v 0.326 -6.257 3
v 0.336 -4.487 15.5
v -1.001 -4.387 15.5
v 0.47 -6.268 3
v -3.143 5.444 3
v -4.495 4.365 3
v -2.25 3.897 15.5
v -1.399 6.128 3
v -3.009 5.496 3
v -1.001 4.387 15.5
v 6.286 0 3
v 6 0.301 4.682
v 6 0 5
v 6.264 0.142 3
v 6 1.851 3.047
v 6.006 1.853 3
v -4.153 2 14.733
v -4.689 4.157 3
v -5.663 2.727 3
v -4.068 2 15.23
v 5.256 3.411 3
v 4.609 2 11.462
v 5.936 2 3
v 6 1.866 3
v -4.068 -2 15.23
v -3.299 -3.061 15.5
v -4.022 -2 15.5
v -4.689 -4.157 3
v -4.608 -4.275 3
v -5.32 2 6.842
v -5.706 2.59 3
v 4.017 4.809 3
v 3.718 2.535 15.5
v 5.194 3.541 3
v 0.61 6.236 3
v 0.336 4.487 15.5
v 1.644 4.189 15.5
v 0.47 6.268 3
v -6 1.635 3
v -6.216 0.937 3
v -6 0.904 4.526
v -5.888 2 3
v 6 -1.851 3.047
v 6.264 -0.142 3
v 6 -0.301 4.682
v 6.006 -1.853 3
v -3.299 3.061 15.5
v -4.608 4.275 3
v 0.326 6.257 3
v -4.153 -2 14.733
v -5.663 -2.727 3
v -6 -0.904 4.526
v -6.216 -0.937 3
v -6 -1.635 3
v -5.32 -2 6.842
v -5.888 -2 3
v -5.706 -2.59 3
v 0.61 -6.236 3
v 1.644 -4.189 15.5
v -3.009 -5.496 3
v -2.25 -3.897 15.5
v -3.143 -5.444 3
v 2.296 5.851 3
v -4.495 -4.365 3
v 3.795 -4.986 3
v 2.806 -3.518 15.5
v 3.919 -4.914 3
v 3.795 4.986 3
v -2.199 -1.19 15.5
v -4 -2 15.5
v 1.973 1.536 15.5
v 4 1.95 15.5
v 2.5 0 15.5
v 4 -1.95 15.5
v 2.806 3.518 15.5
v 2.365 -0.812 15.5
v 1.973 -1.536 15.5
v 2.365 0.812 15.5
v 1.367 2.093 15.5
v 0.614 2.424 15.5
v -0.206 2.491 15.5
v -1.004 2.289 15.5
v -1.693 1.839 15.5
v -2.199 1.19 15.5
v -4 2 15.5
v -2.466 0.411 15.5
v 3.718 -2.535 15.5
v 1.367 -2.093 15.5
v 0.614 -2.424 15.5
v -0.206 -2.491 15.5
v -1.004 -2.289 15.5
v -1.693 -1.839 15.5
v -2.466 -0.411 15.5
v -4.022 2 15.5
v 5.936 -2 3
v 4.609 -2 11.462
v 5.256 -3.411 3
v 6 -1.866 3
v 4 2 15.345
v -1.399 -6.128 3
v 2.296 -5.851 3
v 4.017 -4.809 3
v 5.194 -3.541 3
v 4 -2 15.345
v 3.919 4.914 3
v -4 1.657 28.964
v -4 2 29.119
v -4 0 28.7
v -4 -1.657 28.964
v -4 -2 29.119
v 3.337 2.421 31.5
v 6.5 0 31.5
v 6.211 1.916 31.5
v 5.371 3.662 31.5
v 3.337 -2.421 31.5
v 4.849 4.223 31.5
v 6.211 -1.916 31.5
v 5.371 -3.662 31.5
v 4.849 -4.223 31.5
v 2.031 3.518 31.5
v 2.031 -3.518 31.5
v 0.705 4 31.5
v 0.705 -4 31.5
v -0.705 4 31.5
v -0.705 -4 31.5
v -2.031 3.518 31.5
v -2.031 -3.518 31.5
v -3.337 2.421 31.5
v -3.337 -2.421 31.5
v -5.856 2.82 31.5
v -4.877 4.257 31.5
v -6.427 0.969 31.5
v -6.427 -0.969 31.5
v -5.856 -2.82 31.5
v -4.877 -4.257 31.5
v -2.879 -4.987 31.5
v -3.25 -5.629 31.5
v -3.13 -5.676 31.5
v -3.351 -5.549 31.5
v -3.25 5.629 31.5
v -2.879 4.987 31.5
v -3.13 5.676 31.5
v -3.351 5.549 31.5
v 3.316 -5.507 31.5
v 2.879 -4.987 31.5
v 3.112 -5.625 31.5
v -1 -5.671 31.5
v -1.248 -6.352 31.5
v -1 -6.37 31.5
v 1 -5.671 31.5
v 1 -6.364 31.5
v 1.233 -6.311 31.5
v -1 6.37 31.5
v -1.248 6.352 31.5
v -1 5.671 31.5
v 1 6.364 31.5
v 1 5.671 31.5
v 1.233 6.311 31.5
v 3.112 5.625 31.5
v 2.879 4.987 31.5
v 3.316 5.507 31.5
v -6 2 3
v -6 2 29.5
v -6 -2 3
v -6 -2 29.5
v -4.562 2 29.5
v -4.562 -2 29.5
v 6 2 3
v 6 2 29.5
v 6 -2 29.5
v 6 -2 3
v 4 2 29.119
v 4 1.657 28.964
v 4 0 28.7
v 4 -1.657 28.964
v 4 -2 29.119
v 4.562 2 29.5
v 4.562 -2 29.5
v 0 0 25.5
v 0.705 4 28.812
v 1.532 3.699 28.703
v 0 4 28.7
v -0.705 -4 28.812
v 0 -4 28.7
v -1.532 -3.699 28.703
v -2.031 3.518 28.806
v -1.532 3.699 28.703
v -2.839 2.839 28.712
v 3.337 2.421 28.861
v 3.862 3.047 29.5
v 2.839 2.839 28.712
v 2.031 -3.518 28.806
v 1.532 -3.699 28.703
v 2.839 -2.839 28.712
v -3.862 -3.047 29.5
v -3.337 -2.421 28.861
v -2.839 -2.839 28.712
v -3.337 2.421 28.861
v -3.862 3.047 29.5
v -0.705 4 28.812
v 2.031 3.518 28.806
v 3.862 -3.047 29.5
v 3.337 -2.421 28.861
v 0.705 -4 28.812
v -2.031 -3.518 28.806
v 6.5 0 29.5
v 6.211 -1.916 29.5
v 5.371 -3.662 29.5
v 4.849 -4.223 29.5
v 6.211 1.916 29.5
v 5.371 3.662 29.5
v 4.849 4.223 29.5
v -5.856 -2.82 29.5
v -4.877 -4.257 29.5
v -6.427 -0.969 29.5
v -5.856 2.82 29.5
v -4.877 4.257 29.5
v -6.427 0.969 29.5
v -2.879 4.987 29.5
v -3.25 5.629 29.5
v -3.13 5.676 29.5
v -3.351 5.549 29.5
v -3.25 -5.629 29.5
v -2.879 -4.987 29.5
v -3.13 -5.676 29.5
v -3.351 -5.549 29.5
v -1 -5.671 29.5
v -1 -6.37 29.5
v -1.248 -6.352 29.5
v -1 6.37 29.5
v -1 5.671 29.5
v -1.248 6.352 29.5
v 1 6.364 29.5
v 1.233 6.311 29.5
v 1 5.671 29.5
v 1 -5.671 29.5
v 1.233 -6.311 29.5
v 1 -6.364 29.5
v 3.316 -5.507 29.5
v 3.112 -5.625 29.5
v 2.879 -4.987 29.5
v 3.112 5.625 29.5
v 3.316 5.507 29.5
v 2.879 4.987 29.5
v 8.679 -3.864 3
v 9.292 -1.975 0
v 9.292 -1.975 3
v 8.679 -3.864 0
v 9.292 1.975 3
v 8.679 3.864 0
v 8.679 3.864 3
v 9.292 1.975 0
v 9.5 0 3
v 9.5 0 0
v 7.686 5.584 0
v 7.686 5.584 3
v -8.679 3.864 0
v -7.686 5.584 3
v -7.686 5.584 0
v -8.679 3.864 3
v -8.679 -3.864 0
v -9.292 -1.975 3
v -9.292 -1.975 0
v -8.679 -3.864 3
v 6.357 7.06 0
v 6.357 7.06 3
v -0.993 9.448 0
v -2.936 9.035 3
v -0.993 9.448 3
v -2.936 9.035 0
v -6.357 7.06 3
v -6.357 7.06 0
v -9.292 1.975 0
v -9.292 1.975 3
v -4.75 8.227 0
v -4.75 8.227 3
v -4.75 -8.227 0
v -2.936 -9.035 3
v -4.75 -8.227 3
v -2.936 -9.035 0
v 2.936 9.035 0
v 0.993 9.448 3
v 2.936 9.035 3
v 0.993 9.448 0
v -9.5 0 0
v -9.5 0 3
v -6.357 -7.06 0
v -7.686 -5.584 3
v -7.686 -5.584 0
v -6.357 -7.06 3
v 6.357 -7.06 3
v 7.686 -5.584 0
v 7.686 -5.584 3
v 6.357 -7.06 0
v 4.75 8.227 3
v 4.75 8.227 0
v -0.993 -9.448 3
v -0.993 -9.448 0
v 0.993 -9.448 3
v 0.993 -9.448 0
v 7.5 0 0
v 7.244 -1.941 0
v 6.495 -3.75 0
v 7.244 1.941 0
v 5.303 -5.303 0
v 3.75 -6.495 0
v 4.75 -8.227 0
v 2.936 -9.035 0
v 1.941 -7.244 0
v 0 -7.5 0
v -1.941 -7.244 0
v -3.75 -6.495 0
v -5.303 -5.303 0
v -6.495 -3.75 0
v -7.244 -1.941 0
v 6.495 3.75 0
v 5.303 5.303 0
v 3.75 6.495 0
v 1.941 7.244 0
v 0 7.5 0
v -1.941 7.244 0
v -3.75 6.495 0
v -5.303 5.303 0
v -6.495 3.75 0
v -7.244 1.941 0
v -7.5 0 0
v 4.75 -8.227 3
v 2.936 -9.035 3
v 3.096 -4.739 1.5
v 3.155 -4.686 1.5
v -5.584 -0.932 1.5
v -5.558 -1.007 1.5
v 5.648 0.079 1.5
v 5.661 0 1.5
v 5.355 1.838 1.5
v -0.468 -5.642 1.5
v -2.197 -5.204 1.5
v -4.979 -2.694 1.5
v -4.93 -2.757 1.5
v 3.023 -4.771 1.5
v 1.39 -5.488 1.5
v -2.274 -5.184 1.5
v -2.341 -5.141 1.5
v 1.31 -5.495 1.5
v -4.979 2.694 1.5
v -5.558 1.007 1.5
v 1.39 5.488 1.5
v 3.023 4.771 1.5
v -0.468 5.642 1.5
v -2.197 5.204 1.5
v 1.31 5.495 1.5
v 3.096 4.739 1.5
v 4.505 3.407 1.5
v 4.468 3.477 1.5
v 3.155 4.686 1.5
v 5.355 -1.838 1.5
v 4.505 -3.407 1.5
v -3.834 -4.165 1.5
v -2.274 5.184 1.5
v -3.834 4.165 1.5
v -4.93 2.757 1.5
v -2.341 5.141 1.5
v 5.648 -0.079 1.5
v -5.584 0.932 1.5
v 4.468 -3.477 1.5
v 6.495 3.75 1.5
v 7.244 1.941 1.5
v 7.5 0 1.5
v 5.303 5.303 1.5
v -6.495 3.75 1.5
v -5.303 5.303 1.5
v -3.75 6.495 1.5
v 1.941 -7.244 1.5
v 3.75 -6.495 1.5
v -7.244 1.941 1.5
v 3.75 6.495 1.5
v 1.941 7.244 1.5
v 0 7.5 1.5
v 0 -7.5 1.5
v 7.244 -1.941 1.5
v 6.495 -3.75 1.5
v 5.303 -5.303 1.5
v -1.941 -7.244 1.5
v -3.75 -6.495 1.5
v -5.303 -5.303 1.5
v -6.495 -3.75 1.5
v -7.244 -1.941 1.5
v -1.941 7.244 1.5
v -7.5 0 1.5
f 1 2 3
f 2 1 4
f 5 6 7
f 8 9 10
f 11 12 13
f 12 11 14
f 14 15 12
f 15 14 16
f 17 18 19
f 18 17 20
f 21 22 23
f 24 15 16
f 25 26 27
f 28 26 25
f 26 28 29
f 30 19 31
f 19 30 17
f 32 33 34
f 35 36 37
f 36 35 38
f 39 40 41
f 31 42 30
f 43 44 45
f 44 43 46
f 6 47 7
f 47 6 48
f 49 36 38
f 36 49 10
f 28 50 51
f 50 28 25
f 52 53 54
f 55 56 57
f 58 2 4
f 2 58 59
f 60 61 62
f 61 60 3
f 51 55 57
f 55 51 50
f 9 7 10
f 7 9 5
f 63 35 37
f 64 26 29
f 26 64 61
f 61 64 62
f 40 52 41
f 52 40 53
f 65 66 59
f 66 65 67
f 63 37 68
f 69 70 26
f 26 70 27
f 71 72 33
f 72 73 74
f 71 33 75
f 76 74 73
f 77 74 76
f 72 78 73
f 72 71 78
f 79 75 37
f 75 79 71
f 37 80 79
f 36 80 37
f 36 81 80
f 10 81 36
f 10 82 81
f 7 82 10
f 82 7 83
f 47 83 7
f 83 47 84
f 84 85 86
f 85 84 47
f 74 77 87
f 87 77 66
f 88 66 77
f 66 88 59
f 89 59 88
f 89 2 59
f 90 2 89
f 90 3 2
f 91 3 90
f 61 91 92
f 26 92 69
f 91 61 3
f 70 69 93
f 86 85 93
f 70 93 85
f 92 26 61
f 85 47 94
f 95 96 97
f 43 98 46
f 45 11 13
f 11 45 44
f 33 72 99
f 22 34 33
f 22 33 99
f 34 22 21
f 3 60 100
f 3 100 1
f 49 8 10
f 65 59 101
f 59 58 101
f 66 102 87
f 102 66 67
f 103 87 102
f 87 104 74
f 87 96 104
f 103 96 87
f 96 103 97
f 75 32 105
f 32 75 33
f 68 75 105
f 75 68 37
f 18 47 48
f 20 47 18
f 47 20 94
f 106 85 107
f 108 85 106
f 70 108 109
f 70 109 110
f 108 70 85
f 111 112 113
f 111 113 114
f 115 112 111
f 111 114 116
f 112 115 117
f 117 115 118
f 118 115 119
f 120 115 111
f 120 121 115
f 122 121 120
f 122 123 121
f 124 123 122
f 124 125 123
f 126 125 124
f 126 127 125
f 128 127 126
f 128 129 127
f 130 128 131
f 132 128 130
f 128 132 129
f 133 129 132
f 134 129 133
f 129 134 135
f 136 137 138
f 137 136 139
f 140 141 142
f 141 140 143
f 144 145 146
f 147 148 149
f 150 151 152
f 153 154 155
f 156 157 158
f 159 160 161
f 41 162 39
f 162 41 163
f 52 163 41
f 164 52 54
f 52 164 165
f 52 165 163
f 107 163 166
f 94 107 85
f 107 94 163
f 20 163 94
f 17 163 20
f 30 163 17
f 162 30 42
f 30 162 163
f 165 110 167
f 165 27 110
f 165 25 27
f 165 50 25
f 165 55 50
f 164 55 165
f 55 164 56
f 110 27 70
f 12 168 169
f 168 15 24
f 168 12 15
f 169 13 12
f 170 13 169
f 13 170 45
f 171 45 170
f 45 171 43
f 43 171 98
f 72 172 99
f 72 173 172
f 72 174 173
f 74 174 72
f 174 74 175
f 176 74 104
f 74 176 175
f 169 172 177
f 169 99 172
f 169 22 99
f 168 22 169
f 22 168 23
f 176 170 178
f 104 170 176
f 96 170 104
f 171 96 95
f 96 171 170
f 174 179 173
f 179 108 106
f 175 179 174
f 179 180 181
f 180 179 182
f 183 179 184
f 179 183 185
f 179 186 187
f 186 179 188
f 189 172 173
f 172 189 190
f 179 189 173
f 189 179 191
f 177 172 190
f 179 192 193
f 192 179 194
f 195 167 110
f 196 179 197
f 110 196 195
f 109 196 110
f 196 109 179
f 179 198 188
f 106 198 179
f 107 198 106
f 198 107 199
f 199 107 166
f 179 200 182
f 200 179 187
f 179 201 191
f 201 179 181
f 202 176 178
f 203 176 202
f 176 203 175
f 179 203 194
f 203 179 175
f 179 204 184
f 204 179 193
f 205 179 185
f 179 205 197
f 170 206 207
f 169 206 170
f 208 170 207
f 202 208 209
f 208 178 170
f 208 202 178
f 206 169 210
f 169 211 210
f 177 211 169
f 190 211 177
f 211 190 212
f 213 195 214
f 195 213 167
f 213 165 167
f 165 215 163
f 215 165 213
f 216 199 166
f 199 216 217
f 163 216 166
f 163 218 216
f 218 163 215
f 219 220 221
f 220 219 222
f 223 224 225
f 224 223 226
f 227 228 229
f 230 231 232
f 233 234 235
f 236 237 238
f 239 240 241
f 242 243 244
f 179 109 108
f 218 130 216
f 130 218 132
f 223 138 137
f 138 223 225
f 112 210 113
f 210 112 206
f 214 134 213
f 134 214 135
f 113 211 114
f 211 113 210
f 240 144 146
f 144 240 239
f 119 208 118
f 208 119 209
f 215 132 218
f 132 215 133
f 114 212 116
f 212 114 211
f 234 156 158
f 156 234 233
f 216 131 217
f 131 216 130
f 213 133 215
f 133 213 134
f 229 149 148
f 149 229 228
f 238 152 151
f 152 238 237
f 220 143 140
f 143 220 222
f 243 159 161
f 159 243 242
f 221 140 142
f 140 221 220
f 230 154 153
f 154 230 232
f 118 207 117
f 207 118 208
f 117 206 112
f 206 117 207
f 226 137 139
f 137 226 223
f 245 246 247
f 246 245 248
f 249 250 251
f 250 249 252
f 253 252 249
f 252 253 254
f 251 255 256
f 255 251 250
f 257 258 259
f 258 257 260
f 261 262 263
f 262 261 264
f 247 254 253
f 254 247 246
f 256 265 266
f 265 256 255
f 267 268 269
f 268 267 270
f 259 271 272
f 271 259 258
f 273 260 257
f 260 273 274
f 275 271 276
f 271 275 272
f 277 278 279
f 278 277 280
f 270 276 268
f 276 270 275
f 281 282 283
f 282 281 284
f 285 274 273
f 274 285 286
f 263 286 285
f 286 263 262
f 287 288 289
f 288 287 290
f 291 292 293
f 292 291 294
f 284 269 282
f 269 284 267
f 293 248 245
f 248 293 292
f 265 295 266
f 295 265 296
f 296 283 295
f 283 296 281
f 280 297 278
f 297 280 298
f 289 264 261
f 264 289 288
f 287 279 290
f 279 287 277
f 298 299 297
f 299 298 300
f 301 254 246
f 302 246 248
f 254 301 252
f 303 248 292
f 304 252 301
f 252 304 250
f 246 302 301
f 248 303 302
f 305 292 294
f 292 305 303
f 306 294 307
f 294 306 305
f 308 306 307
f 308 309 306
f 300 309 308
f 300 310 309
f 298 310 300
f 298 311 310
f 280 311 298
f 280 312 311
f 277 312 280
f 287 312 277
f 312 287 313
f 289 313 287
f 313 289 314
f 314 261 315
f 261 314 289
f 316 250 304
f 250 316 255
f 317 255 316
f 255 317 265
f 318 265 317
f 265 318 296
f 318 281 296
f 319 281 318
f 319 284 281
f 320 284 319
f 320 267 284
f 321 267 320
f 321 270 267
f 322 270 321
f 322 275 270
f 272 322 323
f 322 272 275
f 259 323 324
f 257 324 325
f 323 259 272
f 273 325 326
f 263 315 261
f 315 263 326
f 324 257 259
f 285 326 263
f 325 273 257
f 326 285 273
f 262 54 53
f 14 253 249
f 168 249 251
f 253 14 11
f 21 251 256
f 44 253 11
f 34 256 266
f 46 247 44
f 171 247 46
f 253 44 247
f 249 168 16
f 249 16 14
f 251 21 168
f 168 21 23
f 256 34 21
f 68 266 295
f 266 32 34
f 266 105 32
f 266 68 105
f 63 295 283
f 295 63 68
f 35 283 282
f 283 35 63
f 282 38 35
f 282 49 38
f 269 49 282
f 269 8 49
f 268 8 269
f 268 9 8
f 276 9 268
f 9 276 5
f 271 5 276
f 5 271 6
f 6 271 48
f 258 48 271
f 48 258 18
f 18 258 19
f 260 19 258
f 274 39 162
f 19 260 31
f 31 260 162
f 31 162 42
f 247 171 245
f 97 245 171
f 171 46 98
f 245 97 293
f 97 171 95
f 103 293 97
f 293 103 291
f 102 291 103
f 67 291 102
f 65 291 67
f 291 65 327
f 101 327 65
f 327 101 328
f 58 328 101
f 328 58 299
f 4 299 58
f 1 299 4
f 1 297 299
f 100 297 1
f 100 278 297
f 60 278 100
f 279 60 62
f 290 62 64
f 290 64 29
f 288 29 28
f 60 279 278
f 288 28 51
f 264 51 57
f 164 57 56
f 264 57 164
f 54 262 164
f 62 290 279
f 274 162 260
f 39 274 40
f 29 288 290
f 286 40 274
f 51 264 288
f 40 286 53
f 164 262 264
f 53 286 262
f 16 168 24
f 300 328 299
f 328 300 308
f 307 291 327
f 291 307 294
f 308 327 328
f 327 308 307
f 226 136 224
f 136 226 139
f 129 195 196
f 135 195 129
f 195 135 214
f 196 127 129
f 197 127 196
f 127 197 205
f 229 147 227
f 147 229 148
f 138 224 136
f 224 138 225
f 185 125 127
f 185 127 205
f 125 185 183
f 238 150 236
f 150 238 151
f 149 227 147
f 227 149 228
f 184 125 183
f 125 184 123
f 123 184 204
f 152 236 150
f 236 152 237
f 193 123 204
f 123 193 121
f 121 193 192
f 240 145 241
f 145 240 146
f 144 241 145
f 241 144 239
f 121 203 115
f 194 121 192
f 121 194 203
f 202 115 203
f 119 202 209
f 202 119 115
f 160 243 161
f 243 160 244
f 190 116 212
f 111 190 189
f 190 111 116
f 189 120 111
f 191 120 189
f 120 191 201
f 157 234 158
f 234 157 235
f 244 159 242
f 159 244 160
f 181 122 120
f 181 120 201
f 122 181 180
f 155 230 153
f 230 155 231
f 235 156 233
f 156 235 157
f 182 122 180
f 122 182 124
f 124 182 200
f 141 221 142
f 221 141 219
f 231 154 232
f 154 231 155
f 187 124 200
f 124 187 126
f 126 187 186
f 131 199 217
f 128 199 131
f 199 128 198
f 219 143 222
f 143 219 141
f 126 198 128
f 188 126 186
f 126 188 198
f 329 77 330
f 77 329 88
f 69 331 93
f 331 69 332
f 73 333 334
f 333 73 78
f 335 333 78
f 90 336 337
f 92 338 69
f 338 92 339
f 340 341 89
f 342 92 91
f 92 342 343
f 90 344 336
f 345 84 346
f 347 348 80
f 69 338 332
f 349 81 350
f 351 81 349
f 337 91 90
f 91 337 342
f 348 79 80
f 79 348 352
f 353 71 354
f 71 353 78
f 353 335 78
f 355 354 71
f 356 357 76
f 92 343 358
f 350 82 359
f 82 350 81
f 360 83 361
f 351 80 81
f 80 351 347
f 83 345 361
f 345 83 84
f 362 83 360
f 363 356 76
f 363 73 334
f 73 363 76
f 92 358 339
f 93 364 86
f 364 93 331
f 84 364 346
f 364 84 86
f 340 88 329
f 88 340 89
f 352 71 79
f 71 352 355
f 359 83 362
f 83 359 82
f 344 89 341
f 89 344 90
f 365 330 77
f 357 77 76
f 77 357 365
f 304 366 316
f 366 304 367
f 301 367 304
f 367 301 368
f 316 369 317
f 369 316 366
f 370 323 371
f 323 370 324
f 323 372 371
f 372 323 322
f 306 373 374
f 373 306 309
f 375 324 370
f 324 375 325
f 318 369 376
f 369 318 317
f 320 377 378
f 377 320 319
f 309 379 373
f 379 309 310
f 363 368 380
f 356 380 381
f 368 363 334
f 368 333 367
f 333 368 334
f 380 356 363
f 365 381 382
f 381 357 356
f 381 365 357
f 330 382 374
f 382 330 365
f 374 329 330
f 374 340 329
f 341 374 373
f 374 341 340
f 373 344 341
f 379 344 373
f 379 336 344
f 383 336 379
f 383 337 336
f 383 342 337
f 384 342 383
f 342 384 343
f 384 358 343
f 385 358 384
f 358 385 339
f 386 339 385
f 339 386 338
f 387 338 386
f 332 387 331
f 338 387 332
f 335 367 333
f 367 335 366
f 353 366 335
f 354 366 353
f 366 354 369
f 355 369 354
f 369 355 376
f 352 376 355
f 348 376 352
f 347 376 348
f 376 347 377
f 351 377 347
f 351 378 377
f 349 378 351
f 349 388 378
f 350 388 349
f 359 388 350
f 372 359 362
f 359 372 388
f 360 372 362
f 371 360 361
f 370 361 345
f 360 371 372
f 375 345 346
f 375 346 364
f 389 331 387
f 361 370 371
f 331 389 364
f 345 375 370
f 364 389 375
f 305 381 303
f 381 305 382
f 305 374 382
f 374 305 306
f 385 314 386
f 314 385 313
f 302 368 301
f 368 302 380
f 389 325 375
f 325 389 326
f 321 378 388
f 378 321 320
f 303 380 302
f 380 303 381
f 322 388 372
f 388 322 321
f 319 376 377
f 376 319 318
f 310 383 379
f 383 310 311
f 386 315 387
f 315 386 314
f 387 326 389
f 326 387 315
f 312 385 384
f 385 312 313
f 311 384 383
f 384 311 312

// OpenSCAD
alturaApoio = 30;
alturaNozzle = 14;
difference() {
    union() {
//        cylinder(r=9.5, h=3);
        cylinder (r=9.5, h=3);
        translate([0,0,1.5]) {
        cylinder (r1=6.5, r2=4.5, h=alturaNozzle);
        translate([-5, 0, alturaApoio*.5])
        cube(size=[2, 4, alturaApoio], center=true);
        translate([5, 0, alturaApoio*.5])
        cube(size=[2, 4, alturaApoio], center=true);
        translate([0, 0, alturaApoio-6])
         
        cylinder (r1=0, r2=5, h=4);
        translate([0, 0, alturaApoio-2])
        cylinder(r=6.5, h=2);
        }

    }
    union () {
        translate([0,0,0])
        cylinder(r1=6, r2=2.5, h=alturaNozzle+1.5);
        cylinder(r=7.5, h=1.5);
        dentes = [-2, -1, 0, 1, 2];
        lados = [0, 180];
        for (b = lados) {
            for (a = dentes) {
                rotate([0,0,a*20 + b])
                translate([0, -5.5, alturaApoio])
                cube(size=[2, 3, 3], center=true);
            }
        }


    }
//    cylinder(r=5, h=2);
//    cylinder(h = height, r1 = BottomRadius, r2 = TopRadius, center = true/false);

}
